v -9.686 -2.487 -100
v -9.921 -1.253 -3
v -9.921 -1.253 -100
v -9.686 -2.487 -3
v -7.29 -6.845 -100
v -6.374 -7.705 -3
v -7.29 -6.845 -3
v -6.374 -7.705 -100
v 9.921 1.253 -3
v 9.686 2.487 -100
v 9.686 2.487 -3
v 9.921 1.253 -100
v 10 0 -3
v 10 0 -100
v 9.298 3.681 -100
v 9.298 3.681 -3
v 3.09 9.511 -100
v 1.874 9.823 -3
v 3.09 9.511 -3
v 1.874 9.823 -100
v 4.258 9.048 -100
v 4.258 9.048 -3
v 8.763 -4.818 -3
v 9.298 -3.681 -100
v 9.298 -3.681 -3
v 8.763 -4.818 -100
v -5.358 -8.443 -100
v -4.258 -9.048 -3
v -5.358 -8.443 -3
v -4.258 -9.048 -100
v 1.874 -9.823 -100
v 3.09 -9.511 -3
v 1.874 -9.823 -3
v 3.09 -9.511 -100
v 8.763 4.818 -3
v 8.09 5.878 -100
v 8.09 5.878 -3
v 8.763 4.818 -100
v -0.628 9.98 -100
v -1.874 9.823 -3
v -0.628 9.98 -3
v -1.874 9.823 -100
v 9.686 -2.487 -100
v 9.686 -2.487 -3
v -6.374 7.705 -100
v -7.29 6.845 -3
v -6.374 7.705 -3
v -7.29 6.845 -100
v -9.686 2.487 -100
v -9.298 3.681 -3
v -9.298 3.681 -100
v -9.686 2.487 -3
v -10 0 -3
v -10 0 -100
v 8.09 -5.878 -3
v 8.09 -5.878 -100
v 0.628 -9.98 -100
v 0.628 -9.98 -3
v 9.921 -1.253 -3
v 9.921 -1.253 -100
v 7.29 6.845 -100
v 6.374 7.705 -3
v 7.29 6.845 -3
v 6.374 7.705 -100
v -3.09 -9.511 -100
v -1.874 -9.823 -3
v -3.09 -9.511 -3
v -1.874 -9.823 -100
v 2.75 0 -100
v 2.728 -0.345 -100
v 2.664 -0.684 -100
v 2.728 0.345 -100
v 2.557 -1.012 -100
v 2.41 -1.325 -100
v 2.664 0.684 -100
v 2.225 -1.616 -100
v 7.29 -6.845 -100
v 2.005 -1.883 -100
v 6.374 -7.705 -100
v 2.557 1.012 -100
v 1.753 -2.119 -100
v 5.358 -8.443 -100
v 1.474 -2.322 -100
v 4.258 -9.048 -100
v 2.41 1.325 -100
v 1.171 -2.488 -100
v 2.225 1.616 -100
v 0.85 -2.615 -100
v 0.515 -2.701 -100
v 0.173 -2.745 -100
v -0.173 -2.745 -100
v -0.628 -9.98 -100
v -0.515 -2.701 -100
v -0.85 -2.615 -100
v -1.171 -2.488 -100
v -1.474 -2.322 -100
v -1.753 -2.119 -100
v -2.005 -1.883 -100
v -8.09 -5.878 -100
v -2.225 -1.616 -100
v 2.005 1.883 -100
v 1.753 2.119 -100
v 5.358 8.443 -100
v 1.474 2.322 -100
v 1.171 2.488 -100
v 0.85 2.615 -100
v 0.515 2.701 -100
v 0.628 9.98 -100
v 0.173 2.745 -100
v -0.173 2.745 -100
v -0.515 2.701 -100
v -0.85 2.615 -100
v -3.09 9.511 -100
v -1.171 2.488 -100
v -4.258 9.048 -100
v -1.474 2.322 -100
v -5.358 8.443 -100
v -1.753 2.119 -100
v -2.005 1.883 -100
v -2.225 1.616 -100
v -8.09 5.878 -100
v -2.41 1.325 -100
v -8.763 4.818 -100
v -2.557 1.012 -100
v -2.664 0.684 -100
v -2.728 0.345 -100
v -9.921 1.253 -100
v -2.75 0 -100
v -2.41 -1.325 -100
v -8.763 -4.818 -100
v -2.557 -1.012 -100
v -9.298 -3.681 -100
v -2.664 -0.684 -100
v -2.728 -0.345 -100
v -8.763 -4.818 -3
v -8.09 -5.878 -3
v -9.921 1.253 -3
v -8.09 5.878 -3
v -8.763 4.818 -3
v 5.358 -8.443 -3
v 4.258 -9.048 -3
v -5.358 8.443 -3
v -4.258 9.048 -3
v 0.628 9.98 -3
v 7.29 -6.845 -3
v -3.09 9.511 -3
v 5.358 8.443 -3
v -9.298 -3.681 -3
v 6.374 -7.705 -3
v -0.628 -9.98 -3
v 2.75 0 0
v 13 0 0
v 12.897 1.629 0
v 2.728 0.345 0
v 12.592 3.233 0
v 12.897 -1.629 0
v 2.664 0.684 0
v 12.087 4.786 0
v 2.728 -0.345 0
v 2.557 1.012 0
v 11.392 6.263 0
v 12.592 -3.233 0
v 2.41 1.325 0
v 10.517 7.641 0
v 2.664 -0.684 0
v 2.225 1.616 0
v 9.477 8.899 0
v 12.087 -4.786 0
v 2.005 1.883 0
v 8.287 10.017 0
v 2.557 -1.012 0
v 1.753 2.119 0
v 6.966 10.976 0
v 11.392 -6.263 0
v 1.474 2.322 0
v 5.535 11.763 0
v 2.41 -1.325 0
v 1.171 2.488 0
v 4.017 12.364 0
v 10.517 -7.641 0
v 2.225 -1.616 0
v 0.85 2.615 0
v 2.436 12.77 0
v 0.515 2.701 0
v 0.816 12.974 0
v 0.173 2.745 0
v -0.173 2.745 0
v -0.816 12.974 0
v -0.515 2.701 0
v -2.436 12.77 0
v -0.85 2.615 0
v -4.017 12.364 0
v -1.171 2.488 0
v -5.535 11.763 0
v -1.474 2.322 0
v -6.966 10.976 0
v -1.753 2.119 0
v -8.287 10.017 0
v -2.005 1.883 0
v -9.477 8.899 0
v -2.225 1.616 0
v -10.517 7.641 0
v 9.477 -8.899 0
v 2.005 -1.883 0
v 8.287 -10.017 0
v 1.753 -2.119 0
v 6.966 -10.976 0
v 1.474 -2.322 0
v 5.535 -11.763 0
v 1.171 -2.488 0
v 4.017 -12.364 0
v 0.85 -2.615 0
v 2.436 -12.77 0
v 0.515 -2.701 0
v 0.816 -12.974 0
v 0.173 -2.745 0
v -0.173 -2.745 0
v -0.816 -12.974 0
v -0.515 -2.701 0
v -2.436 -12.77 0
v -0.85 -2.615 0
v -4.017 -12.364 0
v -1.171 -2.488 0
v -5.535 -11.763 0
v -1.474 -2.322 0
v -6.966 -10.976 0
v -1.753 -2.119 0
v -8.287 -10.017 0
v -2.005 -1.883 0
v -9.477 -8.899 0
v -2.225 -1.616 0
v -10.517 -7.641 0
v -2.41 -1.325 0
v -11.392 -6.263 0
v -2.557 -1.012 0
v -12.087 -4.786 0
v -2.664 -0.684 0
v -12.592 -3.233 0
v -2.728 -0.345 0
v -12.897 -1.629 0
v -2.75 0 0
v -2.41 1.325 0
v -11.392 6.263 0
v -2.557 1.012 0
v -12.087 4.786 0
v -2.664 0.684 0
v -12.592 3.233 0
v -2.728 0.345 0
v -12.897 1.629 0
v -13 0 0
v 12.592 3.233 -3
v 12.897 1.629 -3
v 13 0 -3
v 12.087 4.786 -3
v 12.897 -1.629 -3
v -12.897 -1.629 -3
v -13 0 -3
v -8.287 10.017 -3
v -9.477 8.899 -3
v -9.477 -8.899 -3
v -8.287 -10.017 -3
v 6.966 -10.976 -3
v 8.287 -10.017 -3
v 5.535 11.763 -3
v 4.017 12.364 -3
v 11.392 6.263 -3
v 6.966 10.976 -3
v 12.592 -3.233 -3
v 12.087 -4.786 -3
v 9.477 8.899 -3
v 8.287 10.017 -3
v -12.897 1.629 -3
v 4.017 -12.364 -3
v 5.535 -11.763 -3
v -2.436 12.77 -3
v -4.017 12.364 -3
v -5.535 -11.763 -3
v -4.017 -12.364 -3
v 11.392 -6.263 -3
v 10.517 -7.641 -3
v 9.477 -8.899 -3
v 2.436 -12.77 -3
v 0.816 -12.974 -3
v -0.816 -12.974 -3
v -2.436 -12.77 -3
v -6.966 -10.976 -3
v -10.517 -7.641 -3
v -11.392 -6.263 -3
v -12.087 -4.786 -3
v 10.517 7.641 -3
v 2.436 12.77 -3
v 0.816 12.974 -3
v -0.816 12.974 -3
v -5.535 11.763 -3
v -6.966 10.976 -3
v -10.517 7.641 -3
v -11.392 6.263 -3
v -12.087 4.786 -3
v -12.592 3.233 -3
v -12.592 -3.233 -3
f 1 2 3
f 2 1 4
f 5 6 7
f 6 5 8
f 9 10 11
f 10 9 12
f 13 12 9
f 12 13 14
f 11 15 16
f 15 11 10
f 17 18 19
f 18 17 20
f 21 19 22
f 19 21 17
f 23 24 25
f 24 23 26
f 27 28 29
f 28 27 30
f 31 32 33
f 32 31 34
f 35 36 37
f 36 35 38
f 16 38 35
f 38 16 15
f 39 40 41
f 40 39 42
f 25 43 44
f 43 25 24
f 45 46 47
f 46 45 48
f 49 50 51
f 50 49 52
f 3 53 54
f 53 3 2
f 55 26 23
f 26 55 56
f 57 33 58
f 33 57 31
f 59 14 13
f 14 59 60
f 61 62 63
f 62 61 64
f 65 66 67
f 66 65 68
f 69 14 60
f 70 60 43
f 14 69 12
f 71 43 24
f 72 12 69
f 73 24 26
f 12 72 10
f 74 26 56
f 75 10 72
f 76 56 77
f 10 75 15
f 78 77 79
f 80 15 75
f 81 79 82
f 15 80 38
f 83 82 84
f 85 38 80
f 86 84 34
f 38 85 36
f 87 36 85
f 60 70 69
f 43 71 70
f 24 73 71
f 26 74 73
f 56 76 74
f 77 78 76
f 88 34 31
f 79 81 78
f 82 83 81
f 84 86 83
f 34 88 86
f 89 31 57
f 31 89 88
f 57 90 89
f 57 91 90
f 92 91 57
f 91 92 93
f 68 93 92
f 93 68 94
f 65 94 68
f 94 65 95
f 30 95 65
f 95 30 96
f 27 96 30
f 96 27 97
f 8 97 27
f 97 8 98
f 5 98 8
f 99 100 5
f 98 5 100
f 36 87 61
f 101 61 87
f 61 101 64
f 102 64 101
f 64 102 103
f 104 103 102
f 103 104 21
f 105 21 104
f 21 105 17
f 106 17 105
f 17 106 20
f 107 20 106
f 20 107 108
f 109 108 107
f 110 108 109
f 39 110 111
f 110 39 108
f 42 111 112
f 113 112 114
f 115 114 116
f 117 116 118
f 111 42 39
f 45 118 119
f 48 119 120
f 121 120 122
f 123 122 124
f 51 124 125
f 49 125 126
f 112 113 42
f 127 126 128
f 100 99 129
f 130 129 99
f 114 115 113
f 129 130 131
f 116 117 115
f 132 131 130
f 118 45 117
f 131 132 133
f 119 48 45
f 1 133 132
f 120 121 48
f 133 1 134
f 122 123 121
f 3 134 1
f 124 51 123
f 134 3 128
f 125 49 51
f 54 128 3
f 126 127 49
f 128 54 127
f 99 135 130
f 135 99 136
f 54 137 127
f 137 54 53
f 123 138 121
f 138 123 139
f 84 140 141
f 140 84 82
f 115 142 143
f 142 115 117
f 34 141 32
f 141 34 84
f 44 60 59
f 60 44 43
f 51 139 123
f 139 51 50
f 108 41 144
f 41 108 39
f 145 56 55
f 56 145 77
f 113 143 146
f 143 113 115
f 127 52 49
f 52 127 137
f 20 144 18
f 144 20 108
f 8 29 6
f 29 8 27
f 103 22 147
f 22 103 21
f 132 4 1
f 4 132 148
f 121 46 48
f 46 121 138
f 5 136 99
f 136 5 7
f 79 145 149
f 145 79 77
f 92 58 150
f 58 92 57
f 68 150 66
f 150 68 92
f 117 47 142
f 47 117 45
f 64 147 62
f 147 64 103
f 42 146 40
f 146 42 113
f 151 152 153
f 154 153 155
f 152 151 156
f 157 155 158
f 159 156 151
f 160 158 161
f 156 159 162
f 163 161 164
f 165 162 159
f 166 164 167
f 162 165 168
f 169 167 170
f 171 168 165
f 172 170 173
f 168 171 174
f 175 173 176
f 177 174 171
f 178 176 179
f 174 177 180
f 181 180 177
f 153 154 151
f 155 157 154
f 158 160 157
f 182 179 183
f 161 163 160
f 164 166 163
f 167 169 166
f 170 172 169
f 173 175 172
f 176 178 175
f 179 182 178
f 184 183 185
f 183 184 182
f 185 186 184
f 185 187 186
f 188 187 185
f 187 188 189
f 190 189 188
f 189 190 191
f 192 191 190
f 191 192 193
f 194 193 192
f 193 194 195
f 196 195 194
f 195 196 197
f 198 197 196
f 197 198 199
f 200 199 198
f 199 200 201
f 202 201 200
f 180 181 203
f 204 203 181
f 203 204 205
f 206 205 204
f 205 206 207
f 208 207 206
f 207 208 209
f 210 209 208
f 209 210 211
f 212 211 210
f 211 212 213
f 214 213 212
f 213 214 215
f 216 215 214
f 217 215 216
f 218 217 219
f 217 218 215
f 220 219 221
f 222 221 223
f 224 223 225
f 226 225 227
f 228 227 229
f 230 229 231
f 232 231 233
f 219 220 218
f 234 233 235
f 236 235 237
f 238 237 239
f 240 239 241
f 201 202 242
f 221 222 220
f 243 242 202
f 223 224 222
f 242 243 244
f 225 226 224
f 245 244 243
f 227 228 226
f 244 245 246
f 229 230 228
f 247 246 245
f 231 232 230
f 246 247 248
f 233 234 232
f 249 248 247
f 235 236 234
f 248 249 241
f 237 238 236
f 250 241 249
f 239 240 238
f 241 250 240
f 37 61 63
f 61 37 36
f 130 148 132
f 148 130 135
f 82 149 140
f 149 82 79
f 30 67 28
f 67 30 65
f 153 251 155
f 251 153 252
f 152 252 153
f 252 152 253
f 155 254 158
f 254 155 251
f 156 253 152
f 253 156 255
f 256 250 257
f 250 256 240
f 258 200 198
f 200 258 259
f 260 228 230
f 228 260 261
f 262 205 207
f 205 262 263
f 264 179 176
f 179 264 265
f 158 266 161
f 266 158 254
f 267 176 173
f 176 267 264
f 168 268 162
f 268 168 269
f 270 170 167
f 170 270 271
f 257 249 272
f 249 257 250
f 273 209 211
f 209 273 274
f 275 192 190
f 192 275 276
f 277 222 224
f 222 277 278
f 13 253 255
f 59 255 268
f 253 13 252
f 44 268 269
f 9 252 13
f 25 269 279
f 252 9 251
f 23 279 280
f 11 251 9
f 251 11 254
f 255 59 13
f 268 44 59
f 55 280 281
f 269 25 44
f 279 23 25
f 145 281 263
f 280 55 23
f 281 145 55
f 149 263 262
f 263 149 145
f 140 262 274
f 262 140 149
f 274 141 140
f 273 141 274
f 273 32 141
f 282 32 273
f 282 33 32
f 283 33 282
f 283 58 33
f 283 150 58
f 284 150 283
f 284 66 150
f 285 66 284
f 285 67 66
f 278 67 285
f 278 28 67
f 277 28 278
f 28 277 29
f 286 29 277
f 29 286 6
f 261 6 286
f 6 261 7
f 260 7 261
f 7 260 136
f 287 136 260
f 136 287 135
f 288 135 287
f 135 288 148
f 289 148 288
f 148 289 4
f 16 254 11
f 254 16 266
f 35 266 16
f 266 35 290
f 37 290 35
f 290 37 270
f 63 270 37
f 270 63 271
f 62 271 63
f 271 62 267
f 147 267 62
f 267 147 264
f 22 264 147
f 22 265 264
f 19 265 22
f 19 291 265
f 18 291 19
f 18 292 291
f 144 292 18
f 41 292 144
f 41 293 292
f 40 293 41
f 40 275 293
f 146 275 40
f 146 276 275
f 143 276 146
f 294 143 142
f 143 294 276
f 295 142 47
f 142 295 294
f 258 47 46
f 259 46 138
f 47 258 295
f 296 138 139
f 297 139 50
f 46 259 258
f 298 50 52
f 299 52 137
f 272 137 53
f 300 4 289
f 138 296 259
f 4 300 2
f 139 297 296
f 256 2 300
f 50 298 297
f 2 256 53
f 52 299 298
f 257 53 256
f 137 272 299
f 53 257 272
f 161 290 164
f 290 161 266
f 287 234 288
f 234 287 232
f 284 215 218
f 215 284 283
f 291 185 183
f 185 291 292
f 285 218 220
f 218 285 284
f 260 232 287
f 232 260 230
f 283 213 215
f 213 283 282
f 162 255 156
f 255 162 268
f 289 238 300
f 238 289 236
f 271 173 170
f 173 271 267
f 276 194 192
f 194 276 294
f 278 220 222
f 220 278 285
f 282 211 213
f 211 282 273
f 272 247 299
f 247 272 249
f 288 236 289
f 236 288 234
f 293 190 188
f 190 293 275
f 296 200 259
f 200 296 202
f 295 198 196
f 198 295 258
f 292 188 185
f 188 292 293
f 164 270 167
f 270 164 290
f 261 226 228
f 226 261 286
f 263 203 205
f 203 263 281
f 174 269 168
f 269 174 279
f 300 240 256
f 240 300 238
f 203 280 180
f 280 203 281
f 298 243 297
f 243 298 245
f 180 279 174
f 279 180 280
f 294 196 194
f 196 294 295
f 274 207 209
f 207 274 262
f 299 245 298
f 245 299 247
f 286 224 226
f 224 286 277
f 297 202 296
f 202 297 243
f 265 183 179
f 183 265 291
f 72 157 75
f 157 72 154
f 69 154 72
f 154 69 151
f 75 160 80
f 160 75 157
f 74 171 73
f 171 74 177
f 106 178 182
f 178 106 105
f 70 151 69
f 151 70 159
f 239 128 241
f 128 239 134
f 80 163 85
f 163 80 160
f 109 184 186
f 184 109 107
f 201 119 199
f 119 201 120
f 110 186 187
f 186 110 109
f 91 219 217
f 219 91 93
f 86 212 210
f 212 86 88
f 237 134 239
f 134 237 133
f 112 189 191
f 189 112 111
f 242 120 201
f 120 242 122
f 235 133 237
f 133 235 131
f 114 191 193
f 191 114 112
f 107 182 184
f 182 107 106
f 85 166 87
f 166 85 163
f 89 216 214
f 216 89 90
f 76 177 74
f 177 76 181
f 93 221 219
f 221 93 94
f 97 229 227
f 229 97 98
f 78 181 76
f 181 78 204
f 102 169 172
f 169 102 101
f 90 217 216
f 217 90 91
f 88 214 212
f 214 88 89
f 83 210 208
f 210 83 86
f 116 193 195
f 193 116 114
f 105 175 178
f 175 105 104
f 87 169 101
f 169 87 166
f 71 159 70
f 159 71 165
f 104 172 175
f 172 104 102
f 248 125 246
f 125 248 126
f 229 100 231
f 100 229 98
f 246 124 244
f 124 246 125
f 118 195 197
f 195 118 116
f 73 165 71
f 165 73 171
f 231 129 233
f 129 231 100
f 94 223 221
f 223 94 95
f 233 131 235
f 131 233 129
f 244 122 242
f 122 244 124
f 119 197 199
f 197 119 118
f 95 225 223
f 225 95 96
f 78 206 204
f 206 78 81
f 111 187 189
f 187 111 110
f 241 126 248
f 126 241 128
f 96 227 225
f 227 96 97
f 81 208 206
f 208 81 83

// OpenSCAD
$fn = 50;


difference() {
	union() {
		translate(v = [0, 0, -100.0000000000]) {
			cylinder(h = 100, r = 10.0000000000);
		}
		translate(v = [0, 0, -3.0000000000]) {
			cylinder(h = 3, r = 13.0000000000);
		}
	}
	union() {
		#translate(v = [0, 0, -100]) {
			cylinder(h = 100, r = 2.7500000000);
		}
	}
}
